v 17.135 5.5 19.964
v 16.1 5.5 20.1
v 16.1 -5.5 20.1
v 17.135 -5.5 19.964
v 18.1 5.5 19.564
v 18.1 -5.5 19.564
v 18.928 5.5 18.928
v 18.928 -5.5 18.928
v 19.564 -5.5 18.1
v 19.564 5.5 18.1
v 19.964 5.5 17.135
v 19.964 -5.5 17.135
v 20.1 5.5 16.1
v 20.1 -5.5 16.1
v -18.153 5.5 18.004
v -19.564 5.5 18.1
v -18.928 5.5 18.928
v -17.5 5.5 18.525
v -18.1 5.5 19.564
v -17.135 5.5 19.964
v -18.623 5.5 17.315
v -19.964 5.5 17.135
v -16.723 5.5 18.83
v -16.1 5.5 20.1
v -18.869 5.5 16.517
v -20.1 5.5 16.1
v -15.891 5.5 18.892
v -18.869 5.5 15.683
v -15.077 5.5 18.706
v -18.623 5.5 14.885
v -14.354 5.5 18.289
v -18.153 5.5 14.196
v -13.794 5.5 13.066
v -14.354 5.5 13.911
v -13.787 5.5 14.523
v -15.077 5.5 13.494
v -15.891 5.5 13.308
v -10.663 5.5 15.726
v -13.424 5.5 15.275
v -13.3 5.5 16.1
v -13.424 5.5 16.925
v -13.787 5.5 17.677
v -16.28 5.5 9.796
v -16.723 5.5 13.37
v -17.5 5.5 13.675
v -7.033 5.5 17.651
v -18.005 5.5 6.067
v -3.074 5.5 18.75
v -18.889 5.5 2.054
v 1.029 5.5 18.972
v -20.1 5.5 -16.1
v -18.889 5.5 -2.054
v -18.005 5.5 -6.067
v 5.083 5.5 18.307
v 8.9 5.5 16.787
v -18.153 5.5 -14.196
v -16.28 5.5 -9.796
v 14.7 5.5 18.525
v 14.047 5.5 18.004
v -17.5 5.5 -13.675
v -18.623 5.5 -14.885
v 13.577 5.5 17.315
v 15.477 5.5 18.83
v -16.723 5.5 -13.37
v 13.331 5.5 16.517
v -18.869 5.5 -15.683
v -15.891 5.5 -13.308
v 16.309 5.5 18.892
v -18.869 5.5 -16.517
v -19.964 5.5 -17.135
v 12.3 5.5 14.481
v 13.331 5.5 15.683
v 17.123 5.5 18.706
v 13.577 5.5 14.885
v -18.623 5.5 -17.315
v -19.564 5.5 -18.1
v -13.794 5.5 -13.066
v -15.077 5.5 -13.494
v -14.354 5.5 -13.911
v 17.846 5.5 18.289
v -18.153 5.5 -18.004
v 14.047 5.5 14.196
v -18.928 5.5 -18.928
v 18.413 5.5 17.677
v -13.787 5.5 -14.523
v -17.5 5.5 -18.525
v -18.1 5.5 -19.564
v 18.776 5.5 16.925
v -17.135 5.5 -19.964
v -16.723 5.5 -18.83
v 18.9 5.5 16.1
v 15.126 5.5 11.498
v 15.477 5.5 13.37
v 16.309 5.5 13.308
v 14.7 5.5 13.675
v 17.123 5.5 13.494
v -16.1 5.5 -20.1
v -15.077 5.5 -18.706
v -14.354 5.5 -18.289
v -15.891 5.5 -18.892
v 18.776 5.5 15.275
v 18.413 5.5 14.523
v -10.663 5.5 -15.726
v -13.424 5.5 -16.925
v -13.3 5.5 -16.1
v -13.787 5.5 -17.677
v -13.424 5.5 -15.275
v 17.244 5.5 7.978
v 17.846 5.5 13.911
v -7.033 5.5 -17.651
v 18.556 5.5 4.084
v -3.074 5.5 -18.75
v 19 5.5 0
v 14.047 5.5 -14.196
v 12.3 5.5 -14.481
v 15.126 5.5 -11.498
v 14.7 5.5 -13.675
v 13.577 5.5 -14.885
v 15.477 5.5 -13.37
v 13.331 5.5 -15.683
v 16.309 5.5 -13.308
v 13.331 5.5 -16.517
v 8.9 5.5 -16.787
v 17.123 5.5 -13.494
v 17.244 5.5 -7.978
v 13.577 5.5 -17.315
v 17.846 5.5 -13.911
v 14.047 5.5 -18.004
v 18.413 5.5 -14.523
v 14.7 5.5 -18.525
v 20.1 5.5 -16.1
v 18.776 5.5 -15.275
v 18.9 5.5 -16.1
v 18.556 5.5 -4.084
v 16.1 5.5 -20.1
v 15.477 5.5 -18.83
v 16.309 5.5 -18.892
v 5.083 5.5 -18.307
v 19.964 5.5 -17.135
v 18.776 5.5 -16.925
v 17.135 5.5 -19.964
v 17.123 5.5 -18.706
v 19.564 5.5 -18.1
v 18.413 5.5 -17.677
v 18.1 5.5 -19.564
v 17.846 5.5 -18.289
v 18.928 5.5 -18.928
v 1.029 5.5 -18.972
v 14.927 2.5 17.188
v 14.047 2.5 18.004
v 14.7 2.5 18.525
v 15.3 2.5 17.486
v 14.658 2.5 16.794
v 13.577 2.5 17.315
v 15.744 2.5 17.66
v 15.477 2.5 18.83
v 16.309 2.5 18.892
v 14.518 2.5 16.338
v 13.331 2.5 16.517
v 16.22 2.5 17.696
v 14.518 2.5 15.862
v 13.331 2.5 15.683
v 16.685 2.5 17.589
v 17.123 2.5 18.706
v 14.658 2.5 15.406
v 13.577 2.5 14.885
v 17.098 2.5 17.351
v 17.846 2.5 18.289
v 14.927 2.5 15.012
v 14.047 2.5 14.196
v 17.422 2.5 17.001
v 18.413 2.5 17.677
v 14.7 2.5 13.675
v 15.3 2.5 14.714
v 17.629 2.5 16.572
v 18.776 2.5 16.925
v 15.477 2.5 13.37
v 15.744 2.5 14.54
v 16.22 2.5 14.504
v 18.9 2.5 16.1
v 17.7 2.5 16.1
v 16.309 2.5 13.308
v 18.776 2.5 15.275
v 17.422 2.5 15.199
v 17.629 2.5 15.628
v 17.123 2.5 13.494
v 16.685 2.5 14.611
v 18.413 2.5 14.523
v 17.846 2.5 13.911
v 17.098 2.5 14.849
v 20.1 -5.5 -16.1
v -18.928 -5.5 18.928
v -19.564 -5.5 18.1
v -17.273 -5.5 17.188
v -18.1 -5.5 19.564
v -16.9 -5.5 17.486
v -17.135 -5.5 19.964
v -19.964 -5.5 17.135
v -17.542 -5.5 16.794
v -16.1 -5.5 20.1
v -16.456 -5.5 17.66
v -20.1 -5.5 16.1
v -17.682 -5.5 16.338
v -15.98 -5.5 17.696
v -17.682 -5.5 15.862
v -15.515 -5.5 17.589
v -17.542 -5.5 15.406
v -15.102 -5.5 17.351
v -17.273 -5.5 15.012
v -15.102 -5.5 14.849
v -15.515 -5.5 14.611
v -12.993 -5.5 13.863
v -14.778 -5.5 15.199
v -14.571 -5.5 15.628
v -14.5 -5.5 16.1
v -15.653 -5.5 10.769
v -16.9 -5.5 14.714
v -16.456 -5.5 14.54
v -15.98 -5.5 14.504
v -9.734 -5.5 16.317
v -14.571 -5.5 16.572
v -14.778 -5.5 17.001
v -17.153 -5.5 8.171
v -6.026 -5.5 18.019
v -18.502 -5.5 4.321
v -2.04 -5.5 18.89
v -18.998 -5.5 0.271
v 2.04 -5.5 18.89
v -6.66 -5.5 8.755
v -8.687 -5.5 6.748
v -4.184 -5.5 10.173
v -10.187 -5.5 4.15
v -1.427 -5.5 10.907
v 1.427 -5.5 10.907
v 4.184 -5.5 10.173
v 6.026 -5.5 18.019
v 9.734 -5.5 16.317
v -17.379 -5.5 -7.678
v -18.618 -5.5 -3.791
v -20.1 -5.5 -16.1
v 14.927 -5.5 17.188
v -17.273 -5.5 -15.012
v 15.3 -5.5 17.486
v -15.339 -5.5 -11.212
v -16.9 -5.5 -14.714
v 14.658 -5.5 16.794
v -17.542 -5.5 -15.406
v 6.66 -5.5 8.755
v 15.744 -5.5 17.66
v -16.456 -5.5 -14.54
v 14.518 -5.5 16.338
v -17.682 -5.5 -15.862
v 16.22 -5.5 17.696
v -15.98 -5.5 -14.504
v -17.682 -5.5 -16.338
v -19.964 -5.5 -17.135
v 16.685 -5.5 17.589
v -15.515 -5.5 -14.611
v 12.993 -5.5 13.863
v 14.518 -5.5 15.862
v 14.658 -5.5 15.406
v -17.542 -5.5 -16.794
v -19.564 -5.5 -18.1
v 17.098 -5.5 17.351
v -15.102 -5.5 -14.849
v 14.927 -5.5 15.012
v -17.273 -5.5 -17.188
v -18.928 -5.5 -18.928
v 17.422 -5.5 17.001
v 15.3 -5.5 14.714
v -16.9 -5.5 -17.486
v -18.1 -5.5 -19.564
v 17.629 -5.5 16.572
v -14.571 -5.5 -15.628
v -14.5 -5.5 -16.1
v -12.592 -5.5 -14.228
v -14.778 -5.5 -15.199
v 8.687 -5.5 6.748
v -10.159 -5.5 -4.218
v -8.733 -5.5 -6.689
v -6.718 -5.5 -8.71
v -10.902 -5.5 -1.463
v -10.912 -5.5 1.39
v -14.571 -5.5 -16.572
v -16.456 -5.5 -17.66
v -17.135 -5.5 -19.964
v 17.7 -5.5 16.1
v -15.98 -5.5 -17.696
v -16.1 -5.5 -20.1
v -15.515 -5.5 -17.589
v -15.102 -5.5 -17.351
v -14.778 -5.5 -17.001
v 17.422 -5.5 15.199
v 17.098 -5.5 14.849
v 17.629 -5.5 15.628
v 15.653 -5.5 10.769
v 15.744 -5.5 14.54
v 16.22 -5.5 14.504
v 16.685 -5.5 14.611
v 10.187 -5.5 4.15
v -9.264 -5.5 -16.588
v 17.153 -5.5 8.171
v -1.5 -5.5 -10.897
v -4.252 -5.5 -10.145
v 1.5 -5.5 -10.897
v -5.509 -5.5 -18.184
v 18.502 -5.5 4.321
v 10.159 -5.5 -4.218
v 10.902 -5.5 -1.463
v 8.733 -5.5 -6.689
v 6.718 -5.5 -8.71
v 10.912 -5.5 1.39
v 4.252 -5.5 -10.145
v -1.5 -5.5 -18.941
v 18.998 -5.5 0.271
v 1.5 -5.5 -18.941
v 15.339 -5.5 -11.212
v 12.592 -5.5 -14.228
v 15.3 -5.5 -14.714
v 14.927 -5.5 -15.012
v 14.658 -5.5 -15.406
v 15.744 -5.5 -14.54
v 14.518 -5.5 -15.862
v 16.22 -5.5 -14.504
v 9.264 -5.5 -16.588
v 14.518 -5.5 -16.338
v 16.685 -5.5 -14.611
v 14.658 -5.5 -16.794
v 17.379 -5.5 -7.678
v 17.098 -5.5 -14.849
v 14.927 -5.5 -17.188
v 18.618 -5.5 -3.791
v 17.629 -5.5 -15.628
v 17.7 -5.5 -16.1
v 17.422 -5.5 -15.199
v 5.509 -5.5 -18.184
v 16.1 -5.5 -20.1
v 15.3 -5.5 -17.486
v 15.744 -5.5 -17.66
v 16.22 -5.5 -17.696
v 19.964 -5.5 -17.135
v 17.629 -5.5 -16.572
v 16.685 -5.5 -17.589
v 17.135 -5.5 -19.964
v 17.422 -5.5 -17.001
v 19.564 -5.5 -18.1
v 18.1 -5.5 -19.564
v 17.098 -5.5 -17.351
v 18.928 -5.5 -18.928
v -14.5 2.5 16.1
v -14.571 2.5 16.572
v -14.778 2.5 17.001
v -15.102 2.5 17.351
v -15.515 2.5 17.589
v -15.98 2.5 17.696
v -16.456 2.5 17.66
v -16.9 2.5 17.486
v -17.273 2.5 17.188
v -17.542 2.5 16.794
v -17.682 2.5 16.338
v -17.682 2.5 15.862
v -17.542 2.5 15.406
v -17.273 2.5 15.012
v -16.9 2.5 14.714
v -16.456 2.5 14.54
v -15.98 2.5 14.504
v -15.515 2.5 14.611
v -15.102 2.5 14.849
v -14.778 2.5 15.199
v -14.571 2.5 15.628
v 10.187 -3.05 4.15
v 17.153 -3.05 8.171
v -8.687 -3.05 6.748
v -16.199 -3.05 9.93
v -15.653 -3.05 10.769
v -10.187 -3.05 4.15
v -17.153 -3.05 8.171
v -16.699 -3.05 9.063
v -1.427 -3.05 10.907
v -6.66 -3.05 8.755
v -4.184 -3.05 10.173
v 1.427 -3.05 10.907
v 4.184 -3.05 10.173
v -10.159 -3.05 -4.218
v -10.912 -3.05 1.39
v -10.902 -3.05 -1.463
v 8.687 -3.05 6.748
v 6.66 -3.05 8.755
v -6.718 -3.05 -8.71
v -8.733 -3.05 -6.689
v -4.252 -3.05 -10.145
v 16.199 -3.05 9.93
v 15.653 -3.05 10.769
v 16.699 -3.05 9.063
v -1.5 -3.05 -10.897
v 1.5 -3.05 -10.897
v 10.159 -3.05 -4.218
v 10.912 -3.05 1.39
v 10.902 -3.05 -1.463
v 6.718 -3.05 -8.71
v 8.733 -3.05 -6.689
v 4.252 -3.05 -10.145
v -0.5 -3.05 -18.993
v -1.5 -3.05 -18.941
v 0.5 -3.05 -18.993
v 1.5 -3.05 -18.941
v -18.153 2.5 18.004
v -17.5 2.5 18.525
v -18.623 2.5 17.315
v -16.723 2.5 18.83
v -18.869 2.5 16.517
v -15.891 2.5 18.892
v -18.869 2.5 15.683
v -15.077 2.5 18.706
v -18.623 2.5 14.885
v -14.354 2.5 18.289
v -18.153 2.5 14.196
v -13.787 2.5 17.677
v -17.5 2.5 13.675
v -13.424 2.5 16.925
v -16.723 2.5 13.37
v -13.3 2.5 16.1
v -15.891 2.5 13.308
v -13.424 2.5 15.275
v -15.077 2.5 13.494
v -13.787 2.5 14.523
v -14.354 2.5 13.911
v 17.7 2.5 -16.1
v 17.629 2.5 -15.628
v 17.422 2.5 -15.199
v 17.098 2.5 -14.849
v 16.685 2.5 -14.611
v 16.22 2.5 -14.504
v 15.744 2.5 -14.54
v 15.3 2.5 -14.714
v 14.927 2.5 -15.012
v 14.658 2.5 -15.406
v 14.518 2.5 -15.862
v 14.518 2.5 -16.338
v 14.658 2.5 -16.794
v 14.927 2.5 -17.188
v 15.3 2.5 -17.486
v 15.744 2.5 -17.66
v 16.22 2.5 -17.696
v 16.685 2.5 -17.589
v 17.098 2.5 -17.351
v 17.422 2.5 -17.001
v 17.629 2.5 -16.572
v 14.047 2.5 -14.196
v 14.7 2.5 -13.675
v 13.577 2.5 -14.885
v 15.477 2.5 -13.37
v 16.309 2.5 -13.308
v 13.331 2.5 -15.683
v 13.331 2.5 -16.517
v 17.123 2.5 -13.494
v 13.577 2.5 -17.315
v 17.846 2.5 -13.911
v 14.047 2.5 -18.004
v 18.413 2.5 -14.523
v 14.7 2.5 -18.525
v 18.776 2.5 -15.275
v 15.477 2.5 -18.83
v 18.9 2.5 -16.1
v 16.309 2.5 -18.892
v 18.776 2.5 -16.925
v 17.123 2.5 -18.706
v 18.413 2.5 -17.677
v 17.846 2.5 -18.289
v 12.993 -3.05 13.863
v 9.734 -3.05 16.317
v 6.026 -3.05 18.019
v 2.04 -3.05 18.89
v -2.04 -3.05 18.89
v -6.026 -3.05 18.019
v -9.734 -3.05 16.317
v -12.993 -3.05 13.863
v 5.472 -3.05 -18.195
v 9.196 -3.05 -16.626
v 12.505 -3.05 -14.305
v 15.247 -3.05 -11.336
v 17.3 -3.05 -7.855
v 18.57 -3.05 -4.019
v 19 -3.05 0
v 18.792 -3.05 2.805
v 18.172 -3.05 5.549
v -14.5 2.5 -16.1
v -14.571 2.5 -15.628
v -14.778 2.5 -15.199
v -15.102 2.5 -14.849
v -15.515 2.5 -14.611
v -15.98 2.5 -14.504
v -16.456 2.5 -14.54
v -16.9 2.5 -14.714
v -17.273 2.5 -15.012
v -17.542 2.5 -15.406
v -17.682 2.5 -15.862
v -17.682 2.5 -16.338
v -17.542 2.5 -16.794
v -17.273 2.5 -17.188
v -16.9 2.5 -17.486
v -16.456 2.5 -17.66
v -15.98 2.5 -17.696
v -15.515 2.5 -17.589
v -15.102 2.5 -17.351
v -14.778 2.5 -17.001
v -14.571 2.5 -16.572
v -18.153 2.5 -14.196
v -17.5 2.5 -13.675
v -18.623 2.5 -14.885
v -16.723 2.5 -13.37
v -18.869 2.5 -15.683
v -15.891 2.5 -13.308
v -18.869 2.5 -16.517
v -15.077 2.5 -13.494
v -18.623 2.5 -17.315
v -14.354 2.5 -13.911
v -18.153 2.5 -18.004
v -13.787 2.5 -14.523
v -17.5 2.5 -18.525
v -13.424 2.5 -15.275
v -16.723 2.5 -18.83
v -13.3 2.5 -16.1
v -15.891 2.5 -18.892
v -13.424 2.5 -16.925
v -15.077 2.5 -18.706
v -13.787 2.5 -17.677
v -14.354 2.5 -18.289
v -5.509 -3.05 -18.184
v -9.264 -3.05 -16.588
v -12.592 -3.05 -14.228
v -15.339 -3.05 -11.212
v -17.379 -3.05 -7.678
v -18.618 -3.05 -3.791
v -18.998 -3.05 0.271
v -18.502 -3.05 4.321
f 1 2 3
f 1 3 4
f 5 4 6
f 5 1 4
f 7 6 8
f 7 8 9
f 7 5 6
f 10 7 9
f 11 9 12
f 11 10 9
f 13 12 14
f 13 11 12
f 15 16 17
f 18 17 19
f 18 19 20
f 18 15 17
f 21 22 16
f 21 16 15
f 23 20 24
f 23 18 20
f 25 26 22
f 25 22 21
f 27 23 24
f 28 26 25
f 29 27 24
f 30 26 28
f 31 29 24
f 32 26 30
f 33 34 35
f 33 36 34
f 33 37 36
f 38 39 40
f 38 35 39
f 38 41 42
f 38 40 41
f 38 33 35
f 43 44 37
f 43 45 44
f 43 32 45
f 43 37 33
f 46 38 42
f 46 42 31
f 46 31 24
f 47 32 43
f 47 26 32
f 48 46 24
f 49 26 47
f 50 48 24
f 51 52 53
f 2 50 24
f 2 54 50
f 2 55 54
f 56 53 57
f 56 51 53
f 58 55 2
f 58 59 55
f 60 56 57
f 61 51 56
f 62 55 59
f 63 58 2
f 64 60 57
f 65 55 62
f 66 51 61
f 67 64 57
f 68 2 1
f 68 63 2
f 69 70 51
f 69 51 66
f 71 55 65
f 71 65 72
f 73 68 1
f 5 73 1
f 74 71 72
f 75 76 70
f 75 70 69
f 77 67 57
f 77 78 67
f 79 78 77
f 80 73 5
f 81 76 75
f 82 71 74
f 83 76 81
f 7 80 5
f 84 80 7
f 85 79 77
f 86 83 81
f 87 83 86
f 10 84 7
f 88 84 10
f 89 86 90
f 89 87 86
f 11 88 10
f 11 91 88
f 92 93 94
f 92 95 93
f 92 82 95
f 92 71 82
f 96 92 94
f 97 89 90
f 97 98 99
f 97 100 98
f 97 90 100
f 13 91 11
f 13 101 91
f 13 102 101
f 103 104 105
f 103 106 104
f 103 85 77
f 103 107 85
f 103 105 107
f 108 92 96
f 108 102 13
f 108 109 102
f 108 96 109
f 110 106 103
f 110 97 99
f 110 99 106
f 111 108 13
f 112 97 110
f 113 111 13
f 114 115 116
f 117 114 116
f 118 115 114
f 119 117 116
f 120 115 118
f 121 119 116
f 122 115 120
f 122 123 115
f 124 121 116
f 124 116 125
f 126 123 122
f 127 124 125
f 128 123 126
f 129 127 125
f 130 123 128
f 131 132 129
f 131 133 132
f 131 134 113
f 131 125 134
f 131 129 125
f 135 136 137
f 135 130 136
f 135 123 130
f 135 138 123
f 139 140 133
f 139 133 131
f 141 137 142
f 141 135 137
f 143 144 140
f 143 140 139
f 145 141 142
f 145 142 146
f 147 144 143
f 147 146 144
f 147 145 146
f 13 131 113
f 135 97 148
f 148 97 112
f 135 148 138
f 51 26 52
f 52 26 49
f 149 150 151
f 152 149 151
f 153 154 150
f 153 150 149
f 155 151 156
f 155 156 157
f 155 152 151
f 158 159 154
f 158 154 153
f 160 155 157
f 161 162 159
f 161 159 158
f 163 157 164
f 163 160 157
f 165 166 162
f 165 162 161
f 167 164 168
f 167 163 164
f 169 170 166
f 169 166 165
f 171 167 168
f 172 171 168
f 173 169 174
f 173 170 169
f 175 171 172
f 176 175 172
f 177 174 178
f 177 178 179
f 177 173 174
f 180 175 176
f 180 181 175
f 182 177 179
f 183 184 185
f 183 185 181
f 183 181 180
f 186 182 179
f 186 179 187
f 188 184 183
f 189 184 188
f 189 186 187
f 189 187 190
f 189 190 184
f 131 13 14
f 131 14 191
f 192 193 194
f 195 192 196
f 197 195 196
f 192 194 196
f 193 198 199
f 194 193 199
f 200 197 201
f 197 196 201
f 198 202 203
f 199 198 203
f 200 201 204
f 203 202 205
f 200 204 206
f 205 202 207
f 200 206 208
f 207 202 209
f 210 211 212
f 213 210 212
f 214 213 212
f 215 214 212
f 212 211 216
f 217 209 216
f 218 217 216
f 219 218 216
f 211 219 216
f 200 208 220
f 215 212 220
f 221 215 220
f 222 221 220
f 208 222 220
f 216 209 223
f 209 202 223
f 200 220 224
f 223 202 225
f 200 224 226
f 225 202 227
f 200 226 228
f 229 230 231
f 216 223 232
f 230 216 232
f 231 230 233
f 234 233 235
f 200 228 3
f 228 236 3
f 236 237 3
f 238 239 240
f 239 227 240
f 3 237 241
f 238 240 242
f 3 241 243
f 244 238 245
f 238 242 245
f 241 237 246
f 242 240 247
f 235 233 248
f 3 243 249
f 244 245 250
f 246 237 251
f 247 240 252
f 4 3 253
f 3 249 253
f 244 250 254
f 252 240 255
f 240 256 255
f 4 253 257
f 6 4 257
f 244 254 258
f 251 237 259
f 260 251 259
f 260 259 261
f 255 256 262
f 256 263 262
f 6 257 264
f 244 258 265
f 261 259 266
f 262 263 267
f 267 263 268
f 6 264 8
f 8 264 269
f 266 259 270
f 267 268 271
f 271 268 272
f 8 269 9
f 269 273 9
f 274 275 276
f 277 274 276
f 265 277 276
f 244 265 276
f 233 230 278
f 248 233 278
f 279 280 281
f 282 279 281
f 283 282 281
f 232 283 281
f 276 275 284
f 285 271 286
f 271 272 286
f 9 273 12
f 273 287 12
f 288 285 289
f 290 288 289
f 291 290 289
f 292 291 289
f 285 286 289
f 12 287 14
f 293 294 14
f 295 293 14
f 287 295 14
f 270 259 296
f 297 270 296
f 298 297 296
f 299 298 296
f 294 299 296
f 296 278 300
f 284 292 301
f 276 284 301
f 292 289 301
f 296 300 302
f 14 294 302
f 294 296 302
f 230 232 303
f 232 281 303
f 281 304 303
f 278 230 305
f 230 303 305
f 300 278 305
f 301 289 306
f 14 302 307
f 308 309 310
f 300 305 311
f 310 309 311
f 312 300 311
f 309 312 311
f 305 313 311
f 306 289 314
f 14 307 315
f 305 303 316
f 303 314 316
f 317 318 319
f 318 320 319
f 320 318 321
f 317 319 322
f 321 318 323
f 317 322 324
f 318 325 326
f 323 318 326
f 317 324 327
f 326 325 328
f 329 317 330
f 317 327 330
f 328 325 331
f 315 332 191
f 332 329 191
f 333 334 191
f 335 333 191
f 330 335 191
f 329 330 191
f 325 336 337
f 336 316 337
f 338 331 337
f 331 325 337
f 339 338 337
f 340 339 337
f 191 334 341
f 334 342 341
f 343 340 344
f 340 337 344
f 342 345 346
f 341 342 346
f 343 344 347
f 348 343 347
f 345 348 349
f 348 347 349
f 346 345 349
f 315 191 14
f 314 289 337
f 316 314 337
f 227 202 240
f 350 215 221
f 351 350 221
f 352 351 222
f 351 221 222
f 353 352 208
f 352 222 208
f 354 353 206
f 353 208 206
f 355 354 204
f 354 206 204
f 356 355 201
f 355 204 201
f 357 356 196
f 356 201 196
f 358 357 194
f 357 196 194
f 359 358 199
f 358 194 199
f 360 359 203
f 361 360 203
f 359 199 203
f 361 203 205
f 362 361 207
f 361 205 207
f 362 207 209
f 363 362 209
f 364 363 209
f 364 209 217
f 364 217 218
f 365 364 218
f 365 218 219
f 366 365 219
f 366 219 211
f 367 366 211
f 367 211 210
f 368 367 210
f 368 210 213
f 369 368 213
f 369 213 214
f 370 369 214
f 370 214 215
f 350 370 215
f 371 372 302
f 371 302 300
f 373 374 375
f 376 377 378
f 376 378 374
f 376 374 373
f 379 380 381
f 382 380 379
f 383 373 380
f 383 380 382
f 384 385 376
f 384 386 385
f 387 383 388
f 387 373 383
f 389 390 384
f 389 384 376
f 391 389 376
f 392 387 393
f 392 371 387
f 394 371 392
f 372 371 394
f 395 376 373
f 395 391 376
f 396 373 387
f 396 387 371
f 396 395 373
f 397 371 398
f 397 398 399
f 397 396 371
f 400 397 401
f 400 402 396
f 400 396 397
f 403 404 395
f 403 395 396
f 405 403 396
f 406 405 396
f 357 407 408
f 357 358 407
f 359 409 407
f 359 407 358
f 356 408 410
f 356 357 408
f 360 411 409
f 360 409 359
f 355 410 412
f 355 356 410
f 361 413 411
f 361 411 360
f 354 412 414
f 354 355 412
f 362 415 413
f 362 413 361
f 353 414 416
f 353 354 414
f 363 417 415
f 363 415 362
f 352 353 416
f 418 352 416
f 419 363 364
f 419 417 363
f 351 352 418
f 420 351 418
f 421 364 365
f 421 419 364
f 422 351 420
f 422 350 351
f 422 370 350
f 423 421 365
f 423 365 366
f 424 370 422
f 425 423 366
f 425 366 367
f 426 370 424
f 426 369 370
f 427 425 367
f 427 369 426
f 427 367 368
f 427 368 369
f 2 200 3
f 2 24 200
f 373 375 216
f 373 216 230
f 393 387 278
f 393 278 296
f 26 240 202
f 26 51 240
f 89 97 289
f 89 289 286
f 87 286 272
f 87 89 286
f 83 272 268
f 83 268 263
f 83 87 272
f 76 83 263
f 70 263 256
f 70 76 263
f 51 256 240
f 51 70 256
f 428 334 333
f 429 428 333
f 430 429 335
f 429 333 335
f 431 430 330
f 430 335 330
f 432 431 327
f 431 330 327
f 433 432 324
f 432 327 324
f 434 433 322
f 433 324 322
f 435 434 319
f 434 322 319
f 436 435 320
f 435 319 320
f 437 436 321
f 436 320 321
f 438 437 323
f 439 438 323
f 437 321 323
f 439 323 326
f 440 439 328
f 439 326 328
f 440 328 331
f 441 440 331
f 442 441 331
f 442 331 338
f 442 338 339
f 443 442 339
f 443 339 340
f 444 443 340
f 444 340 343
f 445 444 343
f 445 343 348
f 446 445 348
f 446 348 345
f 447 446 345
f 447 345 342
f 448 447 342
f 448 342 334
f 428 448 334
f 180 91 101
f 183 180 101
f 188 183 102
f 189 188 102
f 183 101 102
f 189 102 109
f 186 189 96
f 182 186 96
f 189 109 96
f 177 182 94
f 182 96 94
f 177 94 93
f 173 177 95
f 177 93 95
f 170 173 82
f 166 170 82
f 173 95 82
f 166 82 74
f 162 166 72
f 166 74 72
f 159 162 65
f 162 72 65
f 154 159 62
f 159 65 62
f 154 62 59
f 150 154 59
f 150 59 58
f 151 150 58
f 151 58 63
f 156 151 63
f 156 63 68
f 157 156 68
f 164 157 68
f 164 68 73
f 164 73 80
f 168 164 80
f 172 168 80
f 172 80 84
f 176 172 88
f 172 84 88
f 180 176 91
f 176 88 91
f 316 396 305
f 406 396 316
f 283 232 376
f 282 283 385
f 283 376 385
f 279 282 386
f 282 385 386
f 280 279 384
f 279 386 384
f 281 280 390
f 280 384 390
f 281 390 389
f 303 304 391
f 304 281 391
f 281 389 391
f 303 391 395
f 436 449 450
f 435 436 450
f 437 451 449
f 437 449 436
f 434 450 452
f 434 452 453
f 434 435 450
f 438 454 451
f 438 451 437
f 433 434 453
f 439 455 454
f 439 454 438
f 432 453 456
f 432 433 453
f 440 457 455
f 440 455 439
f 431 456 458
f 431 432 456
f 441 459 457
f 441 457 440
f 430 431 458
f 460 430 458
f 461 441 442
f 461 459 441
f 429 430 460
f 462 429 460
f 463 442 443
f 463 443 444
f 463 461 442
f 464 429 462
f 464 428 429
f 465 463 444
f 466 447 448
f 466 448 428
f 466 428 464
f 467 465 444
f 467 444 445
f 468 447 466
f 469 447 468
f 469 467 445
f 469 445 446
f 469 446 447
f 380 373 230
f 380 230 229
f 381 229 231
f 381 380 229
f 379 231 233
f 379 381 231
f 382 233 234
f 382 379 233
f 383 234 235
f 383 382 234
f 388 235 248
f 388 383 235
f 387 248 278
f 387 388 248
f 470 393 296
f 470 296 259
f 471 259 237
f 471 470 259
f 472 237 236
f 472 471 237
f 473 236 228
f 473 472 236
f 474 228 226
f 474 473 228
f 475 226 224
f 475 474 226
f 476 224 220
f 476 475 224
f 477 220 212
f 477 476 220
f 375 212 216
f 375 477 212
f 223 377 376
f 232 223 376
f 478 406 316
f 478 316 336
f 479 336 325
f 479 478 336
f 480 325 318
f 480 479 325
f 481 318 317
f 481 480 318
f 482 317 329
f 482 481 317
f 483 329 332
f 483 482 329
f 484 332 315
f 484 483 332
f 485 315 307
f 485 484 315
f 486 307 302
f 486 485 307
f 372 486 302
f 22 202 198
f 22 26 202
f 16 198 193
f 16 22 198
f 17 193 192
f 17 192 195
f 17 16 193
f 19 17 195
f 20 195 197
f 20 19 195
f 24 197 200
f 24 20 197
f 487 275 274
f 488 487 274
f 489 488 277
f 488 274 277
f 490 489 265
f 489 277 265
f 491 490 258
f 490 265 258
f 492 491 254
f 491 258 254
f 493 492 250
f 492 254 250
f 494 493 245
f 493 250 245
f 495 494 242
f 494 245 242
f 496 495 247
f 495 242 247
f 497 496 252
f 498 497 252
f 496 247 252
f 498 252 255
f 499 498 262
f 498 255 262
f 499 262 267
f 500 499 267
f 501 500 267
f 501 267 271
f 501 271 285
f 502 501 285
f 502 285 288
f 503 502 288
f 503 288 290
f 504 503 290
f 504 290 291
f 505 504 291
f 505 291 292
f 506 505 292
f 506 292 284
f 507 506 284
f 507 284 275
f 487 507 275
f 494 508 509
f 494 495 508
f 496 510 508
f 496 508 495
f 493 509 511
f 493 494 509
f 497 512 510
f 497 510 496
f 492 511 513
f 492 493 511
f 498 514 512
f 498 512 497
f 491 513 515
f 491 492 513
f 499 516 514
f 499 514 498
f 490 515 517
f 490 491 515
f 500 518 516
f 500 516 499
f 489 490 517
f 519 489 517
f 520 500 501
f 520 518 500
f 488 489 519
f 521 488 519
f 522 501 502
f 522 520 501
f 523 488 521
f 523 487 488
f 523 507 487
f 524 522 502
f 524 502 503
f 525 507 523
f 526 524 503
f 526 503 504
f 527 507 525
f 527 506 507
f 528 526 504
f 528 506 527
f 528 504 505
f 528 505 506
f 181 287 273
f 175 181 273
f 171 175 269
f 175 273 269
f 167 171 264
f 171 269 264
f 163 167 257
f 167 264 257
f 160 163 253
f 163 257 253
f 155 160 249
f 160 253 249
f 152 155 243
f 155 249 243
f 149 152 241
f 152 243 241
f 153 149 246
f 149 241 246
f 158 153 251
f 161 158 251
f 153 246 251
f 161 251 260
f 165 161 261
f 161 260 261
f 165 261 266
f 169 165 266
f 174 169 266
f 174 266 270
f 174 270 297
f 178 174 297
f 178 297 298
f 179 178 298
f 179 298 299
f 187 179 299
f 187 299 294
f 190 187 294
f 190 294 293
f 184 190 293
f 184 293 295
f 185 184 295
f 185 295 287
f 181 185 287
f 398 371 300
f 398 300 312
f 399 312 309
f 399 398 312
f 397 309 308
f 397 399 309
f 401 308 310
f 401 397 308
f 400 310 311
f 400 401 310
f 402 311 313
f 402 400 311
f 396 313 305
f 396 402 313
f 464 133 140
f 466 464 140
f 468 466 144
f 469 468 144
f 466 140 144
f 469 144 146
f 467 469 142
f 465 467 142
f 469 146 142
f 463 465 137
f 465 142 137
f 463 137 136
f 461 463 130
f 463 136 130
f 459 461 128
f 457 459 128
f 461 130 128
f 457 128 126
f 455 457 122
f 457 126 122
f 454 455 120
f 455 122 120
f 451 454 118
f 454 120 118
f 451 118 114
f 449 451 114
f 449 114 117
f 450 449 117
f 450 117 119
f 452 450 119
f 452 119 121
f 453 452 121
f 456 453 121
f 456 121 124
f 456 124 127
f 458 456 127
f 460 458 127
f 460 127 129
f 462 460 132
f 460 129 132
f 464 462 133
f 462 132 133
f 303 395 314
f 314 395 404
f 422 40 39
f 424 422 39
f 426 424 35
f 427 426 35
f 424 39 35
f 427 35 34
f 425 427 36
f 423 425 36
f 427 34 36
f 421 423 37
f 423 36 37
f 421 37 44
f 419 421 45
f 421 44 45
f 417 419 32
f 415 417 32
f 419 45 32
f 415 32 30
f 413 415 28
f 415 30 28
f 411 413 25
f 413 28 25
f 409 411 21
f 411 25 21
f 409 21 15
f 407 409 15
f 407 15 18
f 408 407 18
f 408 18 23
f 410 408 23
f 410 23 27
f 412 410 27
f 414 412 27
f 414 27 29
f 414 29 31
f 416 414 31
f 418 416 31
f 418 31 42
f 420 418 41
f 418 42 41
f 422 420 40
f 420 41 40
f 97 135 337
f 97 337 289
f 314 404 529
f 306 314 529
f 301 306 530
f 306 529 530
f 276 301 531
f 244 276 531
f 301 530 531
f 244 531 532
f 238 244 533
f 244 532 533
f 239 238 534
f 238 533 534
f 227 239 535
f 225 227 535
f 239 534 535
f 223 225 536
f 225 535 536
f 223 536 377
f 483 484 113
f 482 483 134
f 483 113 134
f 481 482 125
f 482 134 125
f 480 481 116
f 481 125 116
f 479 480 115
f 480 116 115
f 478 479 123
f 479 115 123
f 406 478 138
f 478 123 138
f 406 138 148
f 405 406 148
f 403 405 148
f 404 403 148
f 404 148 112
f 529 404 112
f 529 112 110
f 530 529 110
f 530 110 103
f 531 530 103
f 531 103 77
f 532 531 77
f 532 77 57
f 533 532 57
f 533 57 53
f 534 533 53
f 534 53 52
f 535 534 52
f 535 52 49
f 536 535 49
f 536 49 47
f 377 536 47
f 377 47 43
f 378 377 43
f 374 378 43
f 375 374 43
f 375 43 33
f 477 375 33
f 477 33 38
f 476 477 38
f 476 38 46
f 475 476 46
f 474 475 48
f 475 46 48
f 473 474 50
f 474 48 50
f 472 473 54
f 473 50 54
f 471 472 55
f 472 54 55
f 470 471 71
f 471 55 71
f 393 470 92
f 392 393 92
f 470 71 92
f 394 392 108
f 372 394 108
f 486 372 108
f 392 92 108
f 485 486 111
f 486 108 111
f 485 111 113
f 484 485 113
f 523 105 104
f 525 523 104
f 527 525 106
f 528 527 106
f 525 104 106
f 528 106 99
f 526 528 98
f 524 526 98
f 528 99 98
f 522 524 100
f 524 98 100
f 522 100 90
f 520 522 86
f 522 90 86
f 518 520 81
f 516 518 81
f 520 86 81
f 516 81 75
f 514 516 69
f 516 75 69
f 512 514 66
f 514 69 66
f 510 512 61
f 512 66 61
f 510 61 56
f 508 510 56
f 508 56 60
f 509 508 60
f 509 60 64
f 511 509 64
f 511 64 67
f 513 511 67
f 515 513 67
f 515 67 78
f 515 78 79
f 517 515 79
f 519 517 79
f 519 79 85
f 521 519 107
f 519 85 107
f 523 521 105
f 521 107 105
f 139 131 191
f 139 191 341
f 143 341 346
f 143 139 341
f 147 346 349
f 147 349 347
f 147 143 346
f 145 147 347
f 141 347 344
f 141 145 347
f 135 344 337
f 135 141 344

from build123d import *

# Parameters (mm, degrees)
RESSALTO_EXTRUS_O1_DEPTH = 5.5
ESBO_O2_R                = 19
CORTE_EXTRUS_O1_DEPTH    = 8.55
CORTE_EXTRUS_O2_DEPTH    = 3.45
ESBO_O4_R                = 1.6
CORTE_EXTRUS_O3_DEPTH    = 12
ESBO_O5_R                = 2.8
CORTE_EXTRUS_O4_DEPTH    = 3


with BuildPart() as part:
    # Esboço1 → Ressalto-extrusão1 (new body, symmetric)
    with BuildSketch(Plane(origin=(0, 0, 0), x_dir=(1, 0, 0), z_dir=(0, 1, 0))):
        with BuildLine():
            Line((-16.1, -20.1), (16.1, -20.1))
            ThreePointArc((16.1, -20.1), (18.928427125, -18.928427125), (20.1, -16.1))
            Line((20.1, -16.1), (20.1, 16.1))
            ThreePointArc((20.1, 16.1), (18.928427125, 18.928427125), (16.1, 20.1))
            Line((16.1, 20.1), (-16.1, 20.1))
            ThreePointArc((-16.1, 20.1), (-18.928427125, 18.928427125), (-20.1, 16.1))
            Line((-20.1, 16.1), (-20.1, -16.1))
            ThreePointArc((-20.1, -16.1), (-18.928427125, -18.928427125), (-16.1, -20.1))
        make_face()
    extrude(amount=RESSALTO_EXTRUS_O1_DEPTH, both=True)

    # Esboço2 → Corte-extrusão1 (cut)
    with BuildSketch(Plane(origin=(0, 5.5, 0), x_dir=(1, 0, 0), z_dir=(0, 1, 0))):
        Circle(ESBO_O2_R)
    extrude(amount=-CORTE_EXTRUS_O1_DEPTH, mode=Mode.SUBTRACT)

    # Esboço3 → Corte-extrusão2 (cut, through all)
    with BuildSketch(Plane(origin=(0, -3.05, 0), x_dir=(1, 0, 0), z_dir=(0, 1, 0))):
        with BuildLine():
            Line((1.5, 10.897247359), (1.5, 18.940696925))
            ThreePointArc((1.5, 18.940696925), (16.454482672, 9.5), (17.153124702, -8.171310357))
            Line((17.153124702, -8.171310357), (10.187293044, -4.149585574))
            ThreePointArc((10.187293044, -4.149585574), (9.526279442, 5.5), (1.5, 10.897247359))
        make_face()
        with BuildLine():
            Line((-1.5, 10.897247359), (-1.5, 18.940696925))
            ThreePointArc((-1.5, 18.940696925), (-16.454482672, 9.5), (-17.153124702, -8.171310357))
            Line((-17.153124702, -8.171310357), (-10.187293044, -4.149585574))
            ThreePointArc((-10.187293044, -4.149585574), (-9.526279442, 5.5), (-1.5, 10.897247359))
        make_face()
        with BuildLine():
            Line((8.687293044, -6.747661785), (15.653124702, -10.769386568))
            ThreePointArc((15.653124702, -10.769386568), (0, -19), (-15.653124702, -10.769386568))
            Line((-15.653124702, -10.769386568), (-8.687293044, -6.747661785))
            ThreePointArc((-8.687293044, -6.747661785), (0, -11), (8.687293044, -6.747661785))
        make_face()
    extrude(amount=-CORTE_EXTRUS_O2_DEPTH, mode=Mode.SUBTRACT)

    # Esboço4 → Corte-extrusão3 (cut, through all)
    with BuildSketch(Plane.XZ.offset(5.5)):
        with Locations((-16.1, 16.1)):
            Circle(ESBO_O4_R)
        with Locations((16.1, 16.1)):
            Circle(ESBO_O4_R)
        with Locations((16.1, -16.1)):
            Circle(ESBO_O4_R)
        with Locations((-16.1, -16.1)):
            Circle(ESBO_O4_R)
    extrude(amount=-CORTE_EXTRUS_O3_DEPTH, mode=Mode.SUBTRACT)

    # Esboço5 → Corte-extrusão4 (cut)
    with BuildSketch(Plane(origin=(0, 5.5, 0), x_dir=(1, 0, 0), z_dir=(0, 1, 0))):
        with Locations((-16.1, 16.1)):
            Circle(ESBO_O5_R)
        with Locations((-16.1, -16.1)):
            Circle(ESBO_O5_R)
        with Locations((16.1, -16.1)):
            Circle(ESBO_O5_R)
        with Locations((16.1, 16.1)):
            Circle(ESBO_O5_R)
    extrude(amount=-CORTE_EXTRUS_O4_DEPTH, mode=Mode.SUBTRACT)


solid = part.part
